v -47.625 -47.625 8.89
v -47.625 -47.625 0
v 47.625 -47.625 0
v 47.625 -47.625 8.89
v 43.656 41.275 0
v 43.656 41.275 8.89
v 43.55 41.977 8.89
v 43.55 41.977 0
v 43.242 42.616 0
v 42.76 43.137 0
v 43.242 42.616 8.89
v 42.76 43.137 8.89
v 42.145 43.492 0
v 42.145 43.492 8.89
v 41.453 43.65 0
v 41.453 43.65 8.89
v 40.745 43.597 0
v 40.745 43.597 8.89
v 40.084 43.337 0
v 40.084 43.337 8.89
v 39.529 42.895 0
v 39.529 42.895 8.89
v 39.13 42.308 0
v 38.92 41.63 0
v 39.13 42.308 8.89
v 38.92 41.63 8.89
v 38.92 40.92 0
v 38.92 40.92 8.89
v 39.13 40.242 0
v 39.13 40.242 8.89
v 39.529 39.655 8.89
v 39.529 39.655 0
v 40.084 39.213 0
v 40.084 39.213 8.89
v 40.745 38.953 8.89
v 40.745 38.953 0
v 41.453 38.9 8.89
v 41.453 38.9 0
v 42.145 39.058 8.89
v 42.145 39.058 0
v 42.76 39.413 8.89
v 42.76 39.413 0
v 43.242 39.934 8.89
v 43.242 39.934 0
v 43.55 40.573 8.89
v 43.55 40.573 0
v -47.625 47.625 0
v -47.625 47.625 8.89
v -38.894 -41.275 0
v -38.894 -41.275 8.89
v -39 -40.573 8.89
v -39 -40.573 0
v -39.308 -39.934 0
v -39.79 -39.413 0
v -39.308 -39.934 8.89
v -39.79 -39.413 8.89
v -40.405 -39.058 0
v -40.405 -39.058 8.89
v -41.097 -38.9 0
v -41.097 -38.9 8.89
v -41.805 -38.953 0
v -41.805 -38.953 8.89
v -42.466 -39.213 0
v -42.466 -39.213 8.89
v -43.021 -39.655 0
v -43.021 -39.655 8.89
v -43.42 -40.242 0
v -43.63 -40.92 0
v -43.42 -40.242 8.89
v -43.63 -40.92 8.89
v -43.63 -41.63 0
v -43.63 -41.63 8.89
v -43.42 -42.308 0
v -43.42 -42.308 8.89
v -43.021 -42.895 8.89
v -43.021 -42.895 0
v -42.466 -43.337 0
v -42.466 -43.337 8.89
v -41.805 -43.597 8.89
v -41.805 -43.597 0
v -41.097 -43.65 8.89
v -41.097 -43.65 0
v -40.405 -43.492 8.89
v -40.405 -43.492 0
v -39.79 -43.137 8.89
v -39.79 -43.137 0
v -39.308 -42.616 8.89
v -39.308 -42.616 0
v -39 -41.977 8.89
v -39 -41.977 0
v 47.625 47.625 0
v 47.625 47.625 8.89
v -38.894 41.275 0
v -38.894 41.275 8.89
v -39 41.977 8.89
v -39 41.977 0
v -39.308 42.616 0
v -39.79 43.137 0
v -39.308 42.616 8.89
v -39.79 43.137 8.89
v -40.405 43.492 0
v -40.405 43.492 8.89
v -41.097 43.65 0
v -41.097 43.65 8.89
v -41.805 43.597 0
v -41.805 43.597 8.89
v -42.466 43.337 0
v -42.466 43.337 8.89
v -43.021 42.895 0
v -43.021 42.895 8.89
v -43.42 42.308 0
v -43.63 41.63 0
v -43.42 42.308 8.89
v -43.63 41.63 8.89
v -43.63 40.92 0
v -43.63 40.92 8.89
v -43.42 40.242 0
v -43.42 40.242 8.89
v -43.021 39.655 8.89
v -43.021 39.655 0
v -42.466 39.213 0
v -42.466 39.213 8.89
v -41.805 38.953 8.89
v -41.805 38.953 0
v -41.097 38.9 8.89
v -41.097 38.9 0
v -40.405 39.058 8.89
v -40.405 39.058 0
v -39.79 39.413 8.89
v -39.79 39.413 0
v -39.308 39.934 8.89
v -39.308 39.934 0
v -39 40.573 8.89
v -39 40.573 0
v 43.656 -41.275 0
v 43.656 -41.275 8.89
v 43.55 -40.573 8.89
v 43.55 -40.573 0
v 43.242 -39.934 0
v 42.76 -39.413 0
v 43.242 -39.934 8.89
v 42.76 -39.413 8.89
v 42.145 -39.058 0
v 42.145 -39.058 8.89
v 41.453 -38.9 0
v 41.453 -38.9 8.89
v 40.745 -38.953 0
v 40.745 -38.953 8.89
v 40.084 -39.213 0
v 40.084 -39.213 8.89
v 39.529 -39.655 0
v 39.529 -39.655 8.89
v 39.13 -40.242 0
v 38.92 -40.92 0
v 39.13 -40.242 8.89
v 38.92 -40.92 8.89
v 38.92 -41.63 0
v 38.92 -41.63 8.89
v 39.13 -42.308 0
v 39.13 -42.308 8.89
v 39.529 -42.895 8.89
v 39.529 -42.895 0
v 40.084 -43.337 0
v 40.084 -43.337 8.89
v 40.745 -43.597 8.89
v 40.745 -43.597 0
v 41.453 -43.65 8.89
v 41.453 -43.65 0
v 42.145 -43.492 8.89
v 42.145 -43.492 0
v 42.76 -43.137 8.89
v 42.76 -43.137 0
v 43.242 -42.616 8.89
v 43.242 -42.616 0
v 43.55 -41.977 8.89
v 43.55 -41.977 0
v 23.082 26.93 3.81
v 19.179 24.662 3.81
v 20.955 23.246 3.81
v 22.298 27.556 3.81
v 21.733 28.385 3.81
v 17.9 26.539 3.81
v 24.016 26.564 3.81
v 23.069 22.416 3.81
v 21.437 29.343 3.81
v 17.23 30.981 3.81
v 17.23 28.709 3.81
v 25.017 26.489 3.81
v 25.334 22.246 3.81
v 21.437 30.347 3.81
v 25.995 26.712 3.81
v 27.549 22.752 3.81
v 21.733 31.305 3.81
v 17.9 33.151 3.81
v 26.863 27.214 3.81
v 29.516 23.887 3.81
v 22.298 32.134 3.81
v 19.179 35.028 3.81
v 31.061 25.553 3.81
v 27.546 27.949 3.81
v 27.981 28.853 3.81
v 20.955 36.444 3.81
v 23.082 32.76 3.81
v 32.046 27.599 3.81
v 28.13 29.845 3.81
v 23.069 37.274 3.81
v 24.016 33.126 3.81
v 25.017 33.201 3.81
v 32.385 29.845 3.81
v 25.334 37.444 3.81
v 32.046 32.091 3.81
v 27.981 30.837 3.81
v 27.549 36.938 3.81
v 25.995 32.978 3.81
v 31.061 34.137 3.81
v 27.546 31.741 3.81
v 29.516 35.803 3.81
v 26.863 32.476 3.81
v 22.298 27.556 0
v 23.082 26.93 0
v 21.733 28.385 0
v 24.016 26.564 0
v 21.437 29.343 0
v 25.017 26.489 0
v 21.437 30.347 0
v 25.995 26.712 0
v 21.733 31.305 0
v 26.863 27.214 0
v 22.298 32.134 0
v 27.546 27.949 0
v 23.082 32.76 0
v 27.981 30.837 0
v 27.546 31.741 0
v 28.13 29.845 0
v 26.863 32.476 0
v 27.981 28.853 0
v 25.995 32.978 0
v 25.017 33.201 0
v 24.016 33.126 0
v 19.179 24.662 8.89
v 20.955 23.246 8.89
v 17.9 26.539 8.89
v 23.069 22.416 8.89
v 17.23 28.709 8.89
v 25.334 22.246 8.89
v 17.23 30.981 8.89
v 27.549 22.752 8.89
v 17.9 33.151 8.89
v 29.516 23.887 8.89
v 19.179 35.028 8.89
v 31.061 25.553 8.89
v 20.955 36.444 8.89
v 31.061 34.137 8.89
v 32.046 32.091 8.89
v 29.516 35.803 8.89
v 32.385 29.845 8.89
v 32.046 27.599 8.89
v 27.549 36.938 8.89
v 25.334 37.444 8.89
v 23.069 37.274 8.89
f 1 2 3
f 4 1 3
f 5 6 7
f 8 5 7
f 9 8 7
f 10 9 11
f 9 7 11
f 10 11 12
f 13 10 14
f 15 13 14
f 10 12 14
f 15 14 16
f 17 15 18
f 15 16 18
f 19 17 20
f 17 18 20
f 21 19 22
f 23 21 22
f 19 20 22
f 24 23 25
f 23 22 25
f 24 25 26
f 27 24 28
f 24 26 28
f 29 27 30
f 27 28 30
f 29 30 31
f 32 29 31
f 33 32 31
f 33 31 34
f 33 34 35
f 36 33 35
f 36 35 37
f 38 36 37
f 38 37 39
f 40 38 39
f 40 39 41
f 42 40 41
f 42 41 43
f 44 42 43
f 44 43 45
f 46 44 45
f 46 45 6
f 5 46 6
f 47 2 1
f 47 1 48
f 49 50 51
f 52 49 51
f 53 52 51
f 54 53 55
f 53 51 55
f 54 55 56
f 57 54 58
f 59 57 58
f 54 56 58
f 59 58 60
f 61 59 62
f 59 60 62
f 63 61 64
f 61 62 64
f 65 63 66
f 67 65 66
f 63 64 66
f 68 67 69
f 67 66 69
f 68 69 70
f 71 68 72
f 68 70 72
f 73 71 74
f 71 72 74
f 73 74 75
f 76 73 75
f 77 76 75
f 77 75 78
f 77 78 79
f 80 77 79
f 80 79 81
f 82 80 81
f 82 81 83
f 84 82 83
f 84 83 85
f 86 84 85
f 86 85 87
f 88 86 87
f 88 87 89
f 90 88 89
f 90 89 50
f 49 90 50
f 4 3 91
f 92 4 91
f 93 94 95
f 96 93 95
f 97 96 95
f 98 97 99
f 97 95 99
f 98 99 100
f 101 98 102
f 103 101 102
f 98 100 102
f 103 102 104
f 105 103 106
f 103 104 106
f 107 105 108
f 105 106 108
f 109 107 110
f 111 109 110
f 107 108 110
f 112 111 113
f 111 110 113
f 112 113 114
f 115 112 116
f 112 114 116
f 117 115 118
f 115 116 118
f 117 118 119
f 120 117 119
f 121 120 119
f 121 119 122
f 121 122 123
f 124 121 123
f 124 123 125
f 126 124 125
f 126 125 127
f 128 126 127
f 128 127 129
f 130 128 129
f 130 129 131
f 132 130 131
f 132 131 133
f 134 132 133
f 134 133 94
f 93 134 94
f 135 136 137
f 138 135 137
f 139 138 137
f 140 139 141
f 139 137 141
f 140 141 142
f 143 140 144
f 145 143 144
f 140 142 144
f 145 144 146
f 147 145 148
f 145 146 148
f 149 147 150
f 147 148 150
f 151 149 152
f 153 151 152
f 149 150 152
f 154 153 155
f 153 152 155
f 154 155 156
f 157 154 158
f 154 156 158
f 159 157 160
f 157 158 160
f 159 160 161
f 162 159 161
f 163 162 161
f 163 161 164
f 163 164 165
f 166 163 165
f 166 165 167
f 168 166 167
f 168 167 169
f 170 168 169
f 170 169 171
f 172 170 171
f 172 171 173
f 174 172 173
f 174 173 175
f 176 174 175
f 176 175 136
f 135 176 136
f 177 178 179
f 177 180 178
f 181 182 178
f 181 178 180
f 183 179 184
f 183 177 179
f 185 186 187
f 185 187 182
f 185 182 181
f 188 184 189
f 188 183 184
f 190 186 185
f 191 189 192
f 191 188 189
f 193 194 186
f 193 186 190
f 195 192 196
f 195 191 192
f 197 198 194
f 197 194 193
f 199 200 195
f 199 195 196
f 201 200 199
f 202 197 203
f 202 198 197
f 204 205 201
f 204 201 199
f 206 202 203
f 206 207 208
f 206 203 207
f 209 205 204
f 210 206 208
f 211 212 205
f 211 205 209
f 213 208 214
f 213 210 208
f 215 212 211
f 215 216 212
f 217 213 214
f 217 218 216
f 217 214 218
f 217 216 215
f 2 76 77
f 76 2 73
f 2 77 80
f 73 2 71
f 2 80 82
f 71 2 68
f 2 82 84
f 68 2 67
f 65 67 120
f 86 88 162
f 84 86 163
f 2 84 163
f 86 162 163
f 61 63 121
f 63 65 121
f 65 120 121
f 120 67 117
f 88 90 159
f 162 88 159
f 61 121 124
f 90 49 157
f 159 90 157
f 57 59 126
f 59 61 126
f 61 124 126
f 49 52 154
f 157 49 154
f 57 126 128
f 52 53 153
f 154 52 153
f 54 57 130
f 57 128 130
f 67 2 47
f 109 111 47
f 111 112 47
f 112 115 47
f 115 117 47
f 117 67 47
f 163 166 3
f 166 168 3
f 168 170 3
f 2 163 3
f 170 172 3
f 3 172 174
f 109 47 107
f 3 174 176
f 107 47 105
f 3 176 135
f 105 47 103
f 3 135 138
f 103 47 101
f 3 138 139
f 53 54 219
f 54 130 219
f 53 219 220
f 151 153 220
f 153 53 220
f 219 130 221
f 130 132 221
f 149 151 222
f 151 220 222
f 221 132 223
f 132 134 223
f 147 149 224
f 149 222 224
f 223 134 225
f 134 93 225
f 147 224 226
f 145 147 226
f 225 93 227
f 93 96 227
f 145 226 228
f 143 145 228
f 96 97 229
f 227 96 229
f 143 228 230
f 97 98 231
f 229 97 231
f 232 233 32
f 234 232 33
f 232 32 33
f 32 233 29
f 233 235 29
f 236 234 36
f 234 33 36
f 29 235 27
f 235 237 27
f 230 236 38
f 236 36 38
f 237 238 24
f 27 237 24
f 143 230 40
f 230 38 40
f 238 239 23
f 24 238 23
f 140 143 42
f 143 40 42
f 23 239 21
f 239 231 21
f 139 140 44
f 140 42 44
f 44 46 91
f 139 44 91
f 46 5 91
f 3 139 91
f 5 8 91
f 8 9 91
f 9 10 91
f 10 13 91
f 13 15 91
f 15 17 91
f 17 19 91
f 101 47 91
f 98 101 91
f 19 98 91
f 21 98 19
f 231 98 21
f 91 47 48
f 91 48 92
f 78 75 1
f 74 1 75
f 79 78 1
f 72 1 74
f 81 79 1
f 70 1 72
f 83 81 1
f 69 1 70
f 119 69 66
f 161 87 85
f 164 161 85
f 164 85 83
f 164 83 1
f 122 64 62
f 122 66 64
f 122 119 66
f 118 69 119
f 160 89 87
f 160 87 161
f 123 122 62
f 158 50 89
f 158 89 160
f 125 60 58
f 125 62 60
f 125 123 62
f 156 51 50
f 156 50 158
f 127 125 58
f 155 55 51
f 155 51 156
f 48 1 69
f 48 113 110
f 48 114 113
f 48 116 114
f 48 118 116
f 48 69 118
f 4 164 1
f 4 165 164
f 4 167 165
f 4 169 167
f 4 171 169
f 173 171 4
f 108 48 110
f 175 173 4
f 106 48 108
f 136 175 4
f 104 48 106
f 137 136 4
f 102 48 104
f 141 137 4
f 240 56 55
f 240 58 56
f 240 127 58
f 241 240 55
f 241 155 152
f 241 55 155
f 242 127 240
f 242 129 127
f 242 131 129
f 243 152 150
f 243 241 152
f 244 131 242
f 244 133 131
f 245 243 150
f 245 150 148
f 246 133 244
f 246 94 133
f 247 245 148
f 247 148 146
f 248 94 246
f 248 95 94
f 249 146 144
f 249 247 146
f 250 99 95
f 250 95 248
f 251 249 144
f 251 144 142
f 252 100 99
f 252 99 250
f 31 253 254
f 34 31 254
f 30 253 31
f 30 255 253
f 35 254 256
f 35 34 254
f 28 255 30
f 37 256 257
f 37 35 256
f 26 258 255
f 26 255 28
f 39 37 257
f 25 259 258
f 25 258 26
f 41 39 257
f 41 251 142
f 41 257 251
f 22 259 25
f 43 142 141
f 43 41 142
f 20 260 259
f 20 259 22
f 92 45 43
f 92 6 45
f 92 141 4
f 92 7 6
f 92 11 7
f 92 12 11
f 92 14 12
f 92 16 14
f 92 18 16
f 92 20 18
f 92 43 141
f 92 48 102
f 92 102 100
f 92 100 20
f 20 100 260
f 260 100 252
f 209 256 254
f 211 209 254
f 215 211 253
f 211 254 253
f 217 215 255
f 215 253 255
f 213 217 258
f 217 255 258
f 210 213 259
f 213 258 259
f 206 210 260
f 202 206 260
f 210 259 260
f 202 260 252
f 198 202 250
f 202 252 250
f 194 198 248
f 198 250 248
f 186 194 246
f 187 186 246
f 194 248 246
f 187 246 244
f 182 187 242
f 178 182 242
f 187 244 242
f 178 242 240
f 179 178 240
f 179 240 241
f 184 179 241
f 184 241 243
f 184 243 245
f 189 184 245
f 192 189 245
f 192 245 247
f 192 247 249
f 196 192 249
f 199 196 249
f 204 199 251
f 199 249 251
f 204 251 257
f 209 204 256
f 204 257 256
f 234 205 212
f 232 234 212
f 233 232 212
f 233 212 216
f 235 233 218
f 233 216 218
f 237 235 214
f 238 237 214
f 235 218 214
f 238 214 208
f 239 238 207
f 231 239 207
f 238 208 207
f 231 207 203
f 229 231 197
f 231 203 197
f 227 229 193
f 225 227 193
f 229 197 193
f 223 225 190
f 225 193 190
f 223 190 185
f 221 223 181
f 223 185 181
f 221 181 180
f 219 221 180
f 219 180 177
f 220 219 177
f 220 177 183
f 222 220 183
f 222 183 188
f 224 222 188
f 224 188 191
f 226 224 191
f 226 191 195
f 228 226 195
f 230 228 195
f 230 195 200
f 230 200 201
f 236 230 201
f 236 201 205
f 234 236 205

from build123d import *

# Parameters (mm, degrees)
SKETCH1_W           = 95.25
SKETCH1_H           = 95.25
BOSS_EXTRUDE1_DEPTH = 8.89
SKETCH2_OUTSIDE_W   = 124.25
SKETCH2_OUTSIDE_H   = 124.25
SKETCH2_OUTSIDE_W_2 = 95.25
SKETCH2_OUTSIDE_H_2 = 95.25
SKETCH2_OUTSIDE_R   = 2.38125
CUT_EXTRUDE2_DEPTH  = 9.89
SKETCH3_R           = 7.62
CUT_EXTRUDE3_DEPTH  = 5.08
SKETCH4_R           = 3.3655
CUT_EXTRUDE4_DEPTH  = 4.81


with BuildPart() as part:
    # Sketch1 → Boss-Extrude1 (new body)
    with BuildSketch(Plane.XY):
        Rectangle(SKETCH1_W, SKETCH1_H)
    extrude(amount=BOSS_EXTRUDE1_DEPTH)

    # Sketch2 outside → Cut-Extrude2 (cut, through all)
    with BuildSketch(Plane.XY.offset(8.89)):
        Rectangle(SKETCH2_OUTSIDE_W, SKETCH2_OUTSIDE_H)
        Rectangle(SKETCH2_OUTSIDE_W_2, SKETCH2_OUTSIDE_H_2, mode=Mode.SUBTRACT)
        with Locations((-41.275, 41.275)):
            Circle(SKETCH2_OUTSIDE_R)
        with Locations((41.275, 41.275)):
            Circle(SKETCH2_OUTSIDE_R)
        with Locations((41.275, -41.275)):
            Circle(SKETCH2_OUTSIDE_R)
        with Locations((-41.275, -41.275)):
            Circle(SKETCH2_OUTSIDE_R)
    extrude(amount=-CUT_EXTRUDE2_DEPTH, mode=Mode.SUBTRACT)

    # Sketch3 → Cut-Extrude3 (cut)
    with BuildSketch(Plane.XY.offset(8.89)):
        with Locations((24.765, 29.845)):
            Circle(SKETCH3_R)
    extrude(amount=-CUT_EXTRUDE3_DEPTH, mode=Mode.SUBTRACT)

    # Sketch4 → Cut-Extrude4 (cut, through all)
    with BuildSketch(Plane.XY.offset(3.81)):
        with Locations((24.765, 29.845)):
            Circle(SKETCH4_R)
    extrude(amount=-CUT_EXTRUDE4_DEPTH, mode=Mode.SUBTRACT)


solid = part.part
